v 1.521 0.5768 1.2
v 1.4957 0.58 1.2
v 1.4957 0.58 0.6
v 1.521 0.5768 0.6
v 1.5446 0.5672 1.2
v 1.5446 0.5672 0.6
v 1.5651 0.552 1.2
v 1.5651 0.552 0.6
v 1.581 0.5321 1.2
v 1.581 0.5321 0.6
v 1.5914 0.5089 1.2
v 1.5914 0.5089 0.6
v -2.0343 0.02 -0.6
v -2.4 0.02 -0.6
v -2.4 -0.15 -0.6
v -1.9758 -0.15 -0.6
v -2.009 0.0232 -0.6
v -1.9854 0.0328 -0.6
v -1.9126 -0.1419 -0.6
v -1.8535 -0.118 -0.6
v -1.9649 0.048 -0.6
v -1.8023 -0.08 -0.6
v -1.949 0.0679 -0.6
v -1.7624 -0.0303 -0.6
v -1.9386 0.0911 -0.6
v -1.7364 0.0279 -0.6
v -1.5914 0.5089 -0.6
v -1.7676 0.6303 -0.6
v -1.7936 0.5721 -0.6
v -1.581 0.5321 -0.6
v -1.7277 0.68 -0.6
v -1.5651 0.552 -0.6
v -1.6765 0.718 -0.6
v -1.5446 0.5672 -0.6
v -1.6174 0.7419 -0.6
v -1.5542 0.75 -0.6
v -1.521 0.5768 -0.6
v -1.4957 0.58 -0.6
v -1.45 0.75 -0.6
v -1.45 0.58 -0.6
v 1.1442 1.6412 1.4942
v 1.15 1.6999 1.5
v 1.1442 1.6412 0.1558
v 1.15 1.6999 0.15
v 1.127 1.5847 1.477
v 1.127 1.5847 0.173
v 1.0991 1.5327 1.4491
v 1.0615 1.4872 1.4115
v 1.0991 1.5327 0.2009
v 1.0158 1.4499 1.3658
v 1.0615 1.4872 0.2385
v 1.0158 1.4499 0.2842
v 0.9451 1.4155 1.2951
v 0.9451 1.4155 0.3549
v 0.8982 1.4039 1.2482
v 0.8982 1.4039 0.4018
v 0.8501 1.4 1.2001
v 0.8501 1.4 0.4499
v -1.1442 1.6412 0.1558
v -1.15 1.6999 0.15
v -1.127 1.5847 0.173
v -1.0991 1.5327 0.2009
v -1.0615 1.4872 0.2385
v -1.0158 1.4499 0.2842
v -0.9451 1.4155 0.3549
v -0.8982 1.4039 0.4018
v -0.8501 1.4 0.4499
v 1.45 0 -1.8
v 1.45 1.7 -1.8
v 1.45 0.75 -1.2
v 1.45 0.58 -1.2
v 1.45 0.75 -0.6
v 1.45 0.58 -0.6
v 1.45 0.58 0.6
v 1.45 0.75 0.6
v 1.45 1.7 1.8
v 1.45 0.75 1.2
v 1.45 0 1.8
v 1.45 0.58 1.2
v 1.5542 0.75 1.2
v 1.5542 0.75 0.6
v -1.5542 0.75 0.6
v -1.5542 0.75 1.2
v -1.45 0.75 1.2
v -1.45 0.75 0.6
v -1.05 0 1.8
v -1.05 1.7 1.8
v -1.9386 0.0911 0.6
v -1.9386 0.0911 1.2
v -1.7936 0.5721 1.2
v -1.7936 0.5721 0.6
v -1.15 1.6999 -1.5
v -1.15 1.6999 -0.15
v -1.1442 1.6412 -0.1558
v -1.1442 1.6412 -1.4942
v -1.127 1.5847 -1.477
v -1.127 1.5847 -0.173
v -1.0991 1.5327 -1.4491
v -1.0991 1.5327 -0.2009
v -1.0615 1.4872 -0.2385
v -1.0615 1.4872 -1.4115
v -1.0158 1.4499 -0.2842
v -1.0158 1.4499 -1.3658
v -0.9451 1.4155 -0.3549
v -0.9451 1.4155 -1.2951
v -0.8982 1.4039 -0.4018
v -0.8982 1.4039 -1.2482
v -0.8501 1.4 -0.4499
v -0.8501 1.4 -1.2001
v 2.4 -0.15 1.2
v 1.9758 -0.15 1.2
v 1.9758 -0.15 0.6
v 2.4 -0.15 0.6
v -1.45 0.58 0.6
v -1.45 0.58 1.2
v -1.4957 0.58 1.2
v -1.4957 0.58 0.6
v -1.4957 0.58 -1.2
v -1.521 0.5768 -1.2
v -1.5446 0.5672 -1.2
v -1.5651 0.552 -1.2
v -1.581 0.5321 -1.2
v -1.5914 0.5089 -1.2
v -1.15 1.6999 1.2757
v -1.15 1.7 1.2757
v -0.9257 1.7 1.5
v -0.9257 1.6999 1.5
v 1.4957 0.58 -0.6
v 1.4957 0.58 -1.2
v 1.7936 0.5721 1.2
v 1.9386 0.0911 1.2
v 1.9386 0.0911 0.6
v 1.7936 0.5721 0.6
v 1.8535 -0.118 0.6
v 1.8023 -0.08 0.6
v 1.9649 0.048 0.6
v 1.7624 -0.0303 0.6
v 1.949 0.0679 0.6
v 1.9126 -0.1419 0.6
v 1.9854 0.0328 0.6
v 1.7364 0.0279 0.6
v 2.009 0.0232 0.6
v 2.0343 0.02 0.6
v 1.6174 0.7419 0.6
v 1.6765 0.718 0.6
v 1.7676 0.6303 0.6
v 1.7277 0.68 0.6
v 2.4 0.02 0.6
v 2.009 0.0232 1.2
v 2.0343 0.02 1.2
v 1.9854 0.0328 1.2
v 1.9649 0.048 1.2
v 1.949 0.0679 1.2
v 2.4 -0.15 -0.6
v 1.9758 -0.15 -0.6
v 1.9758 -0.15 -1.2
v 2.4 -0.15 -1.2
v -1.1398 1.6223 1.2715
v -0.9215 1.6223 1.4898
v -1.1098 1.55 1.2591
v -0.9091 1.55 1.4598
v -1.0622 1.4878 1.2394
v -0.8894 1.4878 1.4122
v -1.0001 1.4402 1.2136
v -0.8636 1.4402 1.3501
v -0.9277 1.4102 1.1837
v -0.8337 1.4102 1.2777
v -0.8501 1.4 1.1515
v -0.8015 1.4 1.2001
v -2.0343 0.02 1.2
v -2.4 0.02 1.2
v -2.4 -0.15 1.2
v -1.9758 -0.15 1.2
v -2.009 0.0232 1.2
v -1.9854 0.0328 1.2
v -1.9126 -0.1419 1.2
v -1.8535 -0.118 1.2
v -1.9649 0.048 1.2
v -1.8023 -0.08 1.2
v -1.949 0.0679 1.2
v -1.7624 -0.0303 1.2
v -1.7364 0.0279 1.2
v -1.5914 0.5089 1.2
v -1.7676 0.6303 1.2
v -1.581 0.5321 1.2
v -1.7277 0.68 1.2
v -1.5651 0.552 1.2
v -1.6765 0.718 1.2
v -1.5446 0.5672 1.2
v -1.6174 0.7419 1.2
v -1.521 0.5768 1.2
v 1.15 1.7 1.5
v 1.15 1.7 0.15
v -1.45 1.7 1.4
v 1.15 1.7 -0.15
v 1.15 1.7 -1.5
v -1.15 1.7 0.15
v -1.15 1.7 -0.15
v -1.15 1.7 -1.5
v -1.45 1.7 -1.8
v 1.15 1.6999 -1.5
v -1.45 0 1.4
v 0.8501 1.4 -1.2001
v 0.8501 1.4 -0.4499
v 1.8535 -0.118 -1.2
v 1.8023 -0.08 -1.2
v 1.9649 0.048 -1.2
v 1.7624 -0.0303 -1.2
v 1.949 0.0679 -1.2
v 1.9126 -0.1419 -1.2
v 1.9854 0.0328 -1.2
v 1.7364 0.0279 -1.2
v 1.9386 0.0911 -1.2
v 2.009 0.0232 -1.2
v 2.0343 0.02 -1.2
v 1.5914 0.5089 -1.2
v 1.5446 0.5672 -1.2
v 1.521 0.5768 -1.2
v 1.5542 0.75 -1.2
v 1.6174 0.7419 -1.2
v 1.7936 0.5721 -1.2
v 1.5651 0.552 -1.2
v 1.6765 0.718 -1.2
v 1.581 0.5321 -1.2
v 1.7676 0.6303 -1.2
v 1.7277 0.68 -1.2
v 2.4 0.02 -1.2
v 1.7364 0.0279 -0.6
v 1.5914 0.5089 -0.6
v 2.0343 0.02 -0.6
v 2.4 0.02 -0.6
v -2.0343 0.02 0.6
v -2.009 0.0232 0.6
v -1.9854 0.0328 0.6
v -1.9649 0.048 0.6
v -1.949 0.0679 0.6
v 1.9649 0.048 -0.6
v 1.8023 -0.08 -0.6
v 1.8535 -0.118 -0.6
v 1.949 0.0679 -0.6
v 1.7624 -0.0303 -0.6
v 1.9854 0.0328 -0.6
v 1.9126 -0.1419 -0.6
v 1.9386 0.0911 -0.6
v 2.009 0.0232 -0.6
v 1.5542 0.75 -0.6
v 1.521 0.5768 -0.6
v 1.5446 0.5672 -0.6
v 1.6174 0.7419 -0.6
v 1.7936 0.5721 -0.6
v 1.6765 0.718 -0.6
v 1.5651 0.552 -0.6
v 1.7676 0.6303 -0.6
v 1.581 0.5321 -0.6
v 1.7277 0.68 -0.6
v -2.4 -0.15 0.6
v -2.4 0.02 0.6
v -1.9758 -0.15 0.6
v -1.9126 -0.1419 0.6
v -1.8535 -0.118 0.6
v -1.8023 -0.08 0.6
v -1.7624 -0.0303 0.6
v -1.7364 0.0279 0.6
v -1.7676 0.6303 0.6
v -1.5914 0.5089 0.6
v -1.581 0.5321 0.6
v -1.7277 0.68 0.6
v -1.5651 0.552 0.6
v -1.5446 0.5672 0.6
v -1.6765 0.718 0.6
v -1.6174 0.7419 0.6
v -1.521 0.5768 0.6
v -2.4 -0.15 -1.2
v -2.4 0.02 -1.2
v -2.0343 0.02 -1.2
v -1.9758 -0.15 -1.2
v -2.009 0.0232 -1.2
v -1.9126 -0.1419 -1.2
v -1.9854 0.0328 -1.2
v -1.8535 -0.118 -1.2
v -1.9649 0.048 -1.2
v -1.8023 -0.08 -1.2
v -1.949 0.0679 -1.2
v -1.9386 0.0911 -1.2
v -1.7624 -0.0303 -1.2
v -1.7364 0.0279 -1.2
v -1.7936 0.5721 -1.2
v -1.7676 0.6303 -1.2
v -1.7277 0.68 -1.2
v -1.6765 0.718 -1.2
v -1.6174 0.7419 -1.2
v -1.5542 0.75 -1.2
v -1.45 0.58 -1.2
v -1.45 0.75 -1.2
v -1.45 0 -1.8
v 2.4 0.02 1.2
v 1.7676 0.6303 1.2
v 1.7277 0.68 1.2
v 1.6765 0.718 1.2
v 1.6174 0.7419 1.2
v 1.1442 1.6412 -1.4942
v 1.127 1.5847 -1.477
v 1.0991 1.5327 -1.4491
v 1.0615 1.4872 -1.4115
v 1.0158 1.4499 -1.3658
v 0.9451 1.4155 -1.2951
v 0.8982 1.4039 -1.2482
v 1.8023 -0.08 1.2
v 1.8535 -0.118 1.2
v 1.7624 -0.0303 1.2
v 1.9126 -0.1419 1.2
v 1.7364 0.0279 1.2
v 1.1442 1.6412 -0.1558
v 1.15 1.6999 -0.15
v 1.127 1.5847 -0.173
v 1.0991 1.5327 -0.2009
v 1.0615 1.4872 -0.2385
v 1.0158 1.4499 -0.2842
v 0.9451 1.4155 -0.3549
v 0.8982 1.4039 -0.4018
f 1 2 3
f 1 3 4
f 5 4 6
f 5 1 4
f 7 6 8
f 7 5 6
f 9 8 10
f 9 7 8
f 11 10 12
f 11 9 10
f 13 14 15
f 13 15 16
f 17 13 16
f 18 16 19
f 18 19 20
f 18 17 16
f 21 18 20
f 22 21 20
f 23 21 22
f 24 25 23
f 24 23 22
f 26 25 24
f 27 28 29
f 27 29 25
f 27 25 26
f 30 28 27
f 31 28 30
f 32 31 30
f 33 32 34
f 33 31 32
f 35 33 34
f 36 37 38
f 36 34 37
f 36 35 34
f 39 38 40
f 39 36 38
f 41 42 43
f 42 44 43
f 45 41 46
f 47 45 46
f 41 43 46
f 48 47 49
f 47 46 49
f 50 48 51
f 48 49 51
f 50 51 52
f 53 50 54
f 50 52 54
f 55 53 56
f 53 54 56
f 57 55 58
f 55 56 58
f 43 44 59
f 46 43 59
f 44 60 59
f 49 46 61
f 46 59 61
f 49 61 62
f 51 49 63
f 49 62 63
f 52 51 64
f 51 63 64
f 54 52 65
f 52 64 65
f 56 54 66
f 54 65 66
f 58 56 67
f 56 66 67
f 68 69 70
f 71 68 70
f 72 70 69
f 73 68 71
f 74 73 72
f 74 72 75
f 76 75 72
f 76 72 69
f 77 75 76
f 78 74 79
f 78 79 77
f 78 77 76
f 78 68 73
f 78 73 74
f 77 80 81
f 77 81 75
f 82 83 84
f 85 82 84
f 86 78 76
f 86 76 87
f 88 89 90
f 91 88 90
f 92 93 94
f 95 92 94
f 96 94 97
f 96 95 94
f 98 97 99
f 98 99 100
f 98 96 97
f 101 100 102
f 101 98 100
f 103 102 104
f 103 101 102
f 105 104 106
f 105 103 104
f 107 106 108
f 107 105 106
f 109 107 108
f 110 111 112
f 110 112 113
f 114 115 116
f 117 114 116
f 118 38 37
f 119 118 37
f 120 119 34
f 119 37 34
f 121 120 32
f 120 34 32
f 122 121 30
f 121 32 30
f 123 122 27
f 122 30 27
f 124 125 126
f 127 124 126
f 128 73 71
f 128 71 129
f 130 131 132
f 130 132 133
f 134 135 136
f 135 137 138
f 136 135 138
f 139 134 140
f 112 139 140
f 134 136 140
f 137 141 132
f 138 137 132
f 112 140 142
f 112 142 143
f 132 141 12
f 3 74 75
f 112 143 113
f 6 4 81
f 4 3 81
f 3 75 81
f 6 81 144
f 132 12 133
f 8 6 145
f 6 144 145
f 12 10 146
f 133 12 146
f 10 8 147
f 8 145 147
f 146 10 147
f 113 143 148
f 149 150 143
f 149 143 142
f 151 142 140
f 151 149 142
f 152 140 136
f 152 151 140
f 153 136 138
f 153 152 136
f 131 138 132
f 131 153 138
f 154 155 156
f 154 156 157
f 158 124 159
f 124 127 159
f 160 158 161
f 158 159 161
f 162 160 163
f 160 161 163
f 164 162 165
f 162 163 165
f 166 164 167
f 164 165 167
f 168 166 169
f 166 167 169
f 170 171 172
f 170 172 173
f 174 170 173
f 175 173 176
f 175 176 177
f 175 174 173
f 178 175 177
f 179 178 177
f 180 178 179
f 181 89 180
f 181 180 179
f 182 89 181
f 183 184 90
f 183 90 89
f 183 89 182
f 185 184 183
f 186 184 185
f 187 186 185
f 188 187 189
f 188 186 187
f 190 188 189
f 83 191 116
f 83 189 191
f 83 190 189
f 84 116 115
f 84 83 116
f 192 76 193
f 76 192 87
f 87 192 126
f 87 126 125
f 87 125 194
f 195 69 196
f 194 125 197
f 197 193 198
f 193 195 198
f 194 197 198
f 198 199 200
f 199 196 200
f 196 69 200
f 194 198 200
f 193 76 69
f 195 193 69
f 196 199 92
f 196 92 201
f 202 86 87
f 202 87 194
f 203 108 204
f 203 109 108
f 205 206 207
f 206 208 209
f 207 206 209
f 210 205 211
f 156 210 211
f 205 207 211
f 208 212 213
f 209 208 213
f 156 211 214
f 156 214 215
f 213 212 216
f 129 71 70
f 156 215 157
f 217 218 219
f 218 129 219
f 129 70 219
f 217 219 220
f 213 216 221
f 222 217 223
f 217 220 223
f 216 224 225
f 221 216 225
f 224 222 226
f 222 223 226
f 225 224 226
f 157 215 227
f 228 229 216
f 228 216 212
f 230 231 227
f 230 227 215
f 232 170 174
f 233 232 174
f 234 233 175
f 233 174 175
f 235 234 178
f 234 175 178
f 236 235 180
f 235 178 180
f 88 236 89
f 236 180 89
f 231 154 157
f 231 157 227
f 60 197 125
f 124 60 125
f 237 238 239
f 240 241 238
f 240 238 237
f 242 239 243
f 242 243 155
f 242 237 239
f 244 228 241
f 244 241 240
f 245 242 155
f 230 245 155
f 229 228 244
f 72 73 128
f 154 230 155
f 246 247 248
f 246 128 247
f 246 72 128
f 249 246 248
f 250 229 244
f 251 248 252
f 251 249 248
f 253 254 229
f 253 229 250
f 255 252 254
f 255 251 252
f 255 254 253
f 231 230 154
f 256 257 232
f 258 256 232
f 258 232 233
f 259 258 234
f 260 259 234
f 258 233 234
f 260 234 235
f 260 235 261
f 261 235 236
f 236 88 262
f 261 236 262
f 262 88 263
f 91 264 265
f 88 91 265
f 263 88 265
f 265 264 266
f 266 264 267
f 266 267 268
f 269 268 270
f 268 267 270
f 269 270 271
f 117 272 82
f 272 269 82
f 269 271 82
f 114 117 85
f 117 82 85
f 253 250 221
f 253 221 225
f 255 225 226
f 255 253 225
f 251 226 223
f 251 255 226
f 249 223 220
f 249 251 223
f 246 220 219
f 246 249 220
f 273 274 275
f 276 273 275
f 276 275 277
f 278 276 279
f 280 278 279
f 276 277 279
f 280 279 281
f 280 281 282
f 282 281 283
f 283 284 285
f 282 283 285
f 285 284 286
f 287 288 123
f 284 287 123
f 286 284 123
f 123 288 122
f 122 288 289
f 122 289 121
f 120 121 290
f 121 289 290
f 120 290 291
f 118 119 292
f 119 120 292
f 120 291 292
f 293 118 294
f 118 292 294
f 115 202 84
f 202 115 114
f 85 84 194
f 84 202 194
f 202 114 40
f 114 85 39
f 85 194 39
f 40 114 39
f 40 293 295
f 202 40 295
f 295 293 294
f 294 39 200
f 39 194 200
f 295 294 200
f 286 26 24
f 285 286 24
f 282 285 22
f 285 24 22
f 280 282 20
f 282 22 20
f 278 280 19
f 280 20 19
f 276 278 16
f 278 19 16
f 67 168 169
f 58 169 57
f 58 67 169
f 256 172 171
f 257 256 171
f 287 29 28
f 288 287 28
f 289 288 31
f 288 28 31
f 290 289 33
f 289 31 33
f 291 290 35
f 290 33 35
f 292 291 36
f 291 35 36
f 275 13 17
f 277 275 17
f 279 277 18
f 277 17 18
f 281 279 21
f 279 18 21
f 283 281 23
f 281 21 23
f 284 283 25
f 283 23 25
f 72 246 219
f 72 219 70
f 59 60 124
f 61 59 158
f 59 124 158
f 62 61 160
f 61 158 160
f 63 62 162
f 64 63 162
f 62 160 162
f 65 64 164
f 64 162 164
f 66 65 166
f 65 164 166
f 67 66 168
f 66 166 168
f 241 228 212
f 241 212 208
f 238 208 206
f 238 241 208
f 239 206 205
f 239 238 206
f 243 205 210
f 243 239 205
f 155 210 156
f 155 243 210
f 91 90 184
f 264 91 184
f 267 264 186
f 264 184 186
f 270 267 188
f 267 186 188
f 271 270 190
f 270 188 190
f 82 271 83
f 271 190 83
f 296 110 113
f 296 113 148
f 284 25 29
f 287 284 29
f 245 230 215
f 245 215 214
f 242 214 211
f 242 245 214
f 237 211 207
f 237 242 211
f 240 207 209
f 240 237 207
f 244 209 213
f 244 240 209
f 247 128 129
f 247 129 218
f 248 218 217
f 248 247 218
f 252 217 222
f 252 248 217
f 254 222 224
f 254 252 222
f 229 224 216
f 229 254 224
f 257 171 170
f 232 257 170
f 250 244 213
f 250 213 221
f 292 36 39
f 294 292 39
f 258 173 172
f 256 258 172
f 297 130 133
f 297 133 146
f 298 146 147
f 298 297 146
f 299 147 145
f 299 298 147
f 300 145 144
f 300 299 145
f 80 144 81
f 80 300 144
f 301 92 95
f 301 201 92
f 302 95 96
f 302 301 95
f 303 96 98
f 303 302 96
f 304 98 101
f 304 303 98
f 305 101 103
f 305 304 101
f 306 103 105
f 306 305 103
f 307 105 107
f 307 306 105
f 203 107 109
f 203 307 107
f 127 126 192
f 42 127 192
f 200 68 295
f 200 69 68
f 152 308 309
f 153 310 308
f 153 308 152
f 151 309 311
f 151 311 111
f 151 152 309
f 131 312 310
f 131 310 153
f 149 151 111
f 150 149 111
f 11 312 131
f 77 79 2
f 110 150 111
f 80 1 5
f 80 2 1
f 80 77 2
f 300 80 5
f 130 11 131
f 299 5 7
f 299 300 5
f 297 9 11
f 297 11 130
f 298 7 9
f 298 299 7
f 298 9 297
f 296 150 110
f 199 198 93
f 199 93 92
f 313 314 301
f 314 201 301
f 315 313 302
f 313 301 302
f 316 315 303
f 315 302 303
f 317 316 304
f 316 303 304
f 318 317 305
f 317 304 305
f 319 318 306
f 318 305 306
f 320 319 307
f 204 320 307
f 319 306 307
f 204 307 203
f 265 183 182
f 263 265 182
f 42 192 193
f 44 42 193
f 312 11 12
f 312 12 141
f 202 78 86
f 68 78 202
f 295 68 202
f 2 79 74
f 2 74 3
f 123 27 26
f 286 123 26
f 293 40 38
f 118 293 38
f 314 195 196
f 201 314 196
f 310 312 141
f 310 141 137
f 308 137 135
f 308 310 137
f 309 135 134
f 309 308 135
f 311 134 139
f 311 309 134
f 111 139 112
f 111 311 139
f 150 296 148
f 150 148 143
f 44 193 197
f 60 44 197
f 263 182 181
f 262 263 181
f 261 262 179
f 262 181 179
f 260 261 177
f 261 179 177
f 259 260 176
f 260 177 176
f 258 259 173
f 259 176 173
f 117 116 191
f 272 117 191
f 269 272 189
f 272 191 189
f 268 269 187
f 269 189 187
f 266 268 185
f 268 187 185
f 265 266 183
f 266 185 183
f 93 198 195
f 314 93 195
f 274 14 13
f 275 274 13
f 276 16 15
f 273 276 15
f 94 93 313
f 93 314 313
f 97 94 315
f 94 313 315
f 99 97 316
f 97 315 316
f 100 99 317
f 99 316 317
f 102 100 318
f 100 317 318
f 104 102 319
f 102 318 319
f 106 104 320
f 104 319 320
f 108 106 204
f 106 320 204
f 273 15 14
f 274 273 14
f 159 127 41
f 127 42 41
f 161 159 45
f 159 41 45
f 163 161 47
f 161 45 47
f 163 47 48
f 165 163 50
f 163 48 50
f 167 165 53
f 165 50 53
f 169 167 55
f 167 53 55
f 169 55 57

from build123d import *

# Parameters (mm, degrees)
EXTRUDE_1_DEPTH     = 1.7
SKETCH_2_W          = 2.3
SKETCH_2_H          = 1.35
CUT_EXTRUDE_1_DEPTH = 0.3
FILLET_1_R          = 0.3
FILLET_2_R          = 0.3
EXTRUDE_2_DEPTH     = 3.6
SKETCH_4_W          = 0.95
SKETCH_4_H          = 0.6
SKETCH_4_H_2        = 1.2
CUT_EXTRUDE_2_DEPTH = 3.6


with BuildPart() as part:
    # Эскиз1 → Бобышка-Вытянуть1 (new body)
    with BuildSketch(Plane(origin=(0, 0, 0), x_dir=(1, 0, 0), z_dir=(0, 1, 0))):
        Polygon((1.45, -1.8), (-1.05, -1.8), (-1.45, -1.4), (-1.45, 1.8), (1.45, 1.8), align=None)
    extrude(amount=EXTRUDE_1_DEPTH)

    # Эскиз2 → Вырез-Вытянуть1 (cut)
    with BuildSketch(Plane(origin=(0, 1.7, 0), x_dir=(1, 0, 0), z_dir=(0, 1, 0))):
        with Locations((0, 0.825)):
            Rectangle(SKETCH_2_W, SKETCH_2_H)
        Polygon((-1.15, -1.275735931), (-0.925735931, -1.5), (1.15, -1.5), (1.15, -0.15), (-1.15, -0.15), align=None)
    extrude(amount=-CUT_EXTRUDE_1_DEPTH, mode=Mode.SUBTRACT)

    # Скругление1
    fillet_1_edges = [part.edges().sort_by_distance(p)[0] for p in [
        (0, 1.4, -0.15),
        (-1.15, 1.4, -0.825),
        (0, 1.4, -1.5),
        (1.15, 1.4, -0.825),
    ]]
    fillet(fillet_1_edges, radius=FILLET_1_R - 0.0001)  # a hair under: the kernel refuses the full size

    # Скругление2
    fillet_2_edges = [part.edges().sort_by_distance(p)[0] for p in [
        (0.112132034, 1.4, 1.5),
        (-1.037867966, 1.4, 1.387867966),
        (-1.15, 1.4, 0.712867966),
        (0, 1.4, 0.15),
        (1.15, 1.4, 0.825),
    ]]
    fillet(fillet_2_edges, radius=FILLET_2_R - 0.0001)  # a hair under: the kernel refuses the full size

    # Эскиз3 → Бобышка-Вытянуть2 (add)
    with BuildSketch(Plane.XY.offset(1.8)):
        with BuildLine():
            ThreePointArc((-2.034305524, 0.02), (-1.974662878, 0.039733227), (-1.93855907, 0.091144904))
            Line((-1.93855907, 0.091144904), (-1.793602325, 0.572137739))
            ThreePointArc((-1.793602325, 0.572137739), (-1.703342805, 0.700666932), (-1.55423619, 0.75))
            Line((-1.55423619, 0.75), (-1.45, 0.75))
            Line((-1.45, 0.75), (-1.45, 0.58))
            Line((-1.45, 0.58), (-1.495694476, 0.58))
            ThreePointArc((-1.495694476, 0.58), (-1.555337122, 0.560266773), (-1.59144093, 0.508855096))
            Line((-1.59144093, 0.508855096), (-1.736397675, 0.027862261))
            ThreePointArc((-1.736397675, 0.027862261), (-1.826657195, -0.100666932), (-1.97576381, -0.15))
            Line((-1.97576381, -0.15), (-2.4, -0.15))
            Line((-2.4, -0.15), (-2.4, 0.02))
            Line((-2.4, 0.02), (-2.034305524, 0.02))
        make_face()
        with BuildLine():
            ThreePointArc((1.495694476, 0.58), (1.555337122, 0.560266773), (1.59144093, 0.508855096))
            Line((1.59144093, 0.508855096), (1.736397675, 0.027862261))
            ThreePointArc((1.736397675, 0.027862261), (1.826657195, -0.100666932), (1.97576381, -0.15))
            Line((1.97576381, -0.15), (2.4, -0.15))
            Line((2.4, -0.15), (2.4, 0.02))
            Line((2.4, 0.02), (2.034305524, 0.02))
            ThreePointArc((2.034305524, 0.02), (1.974662878, 0.039733227), (1.93855907, 0.091144904))
            Line((1.93855907, 0.091144904), (1.793602325, 0.572137739))
            ThreePointArc((1.793602325, 0.572137739), (1.703342805, 0.700666932), (1.55423619, 0.75))
            Line((1.55423619, 0.75), (1.45, 0.75))
            Line((1.45, 0.75), (1.45, 0.58))
            Line((1.45, 0.58), (1.495694476, 0.58))
        make_face()
    extrude(amount=-EXTRUDE_2_DEPTH)

    # Эскиз4 → Вырез-Вытянуть2 (cut)
    with BuildSketch(Plane(origin=(0, 0.75, 0), x_dir=(1, 0, 0), z_dir=(0, 1, 0))):
        with Locations((1.925, 1.5)):
            Rectangle(SKETCH_4_W, SKETCH_4_H)
        with Locations((-1.925, 1.5)):
            Rectangle(SKETCH_4_W, SKETCH_4_H)
        with Locations((1.925, 0)):
            Rectangle(SKETCH_4_W, SKETCH_4_H_2)
        with Locations((-1.925, 0)):
            Rectangle(SKETCH_4_W, SKETCH_4_H_2)
        with Locations((-1.925, -1.5)):
            Rectangle(SKETCH_4_W, SKETCH_4_H)
        with Locations((1.925, -1.5)):
            Rectangle(SKETCH_4_W, SKETCH_4_H)
    extrude(amount=-CUT_EXTRUDE_2_DEPTH, mode=Mode.SUBTRACT)


solid = part.part
